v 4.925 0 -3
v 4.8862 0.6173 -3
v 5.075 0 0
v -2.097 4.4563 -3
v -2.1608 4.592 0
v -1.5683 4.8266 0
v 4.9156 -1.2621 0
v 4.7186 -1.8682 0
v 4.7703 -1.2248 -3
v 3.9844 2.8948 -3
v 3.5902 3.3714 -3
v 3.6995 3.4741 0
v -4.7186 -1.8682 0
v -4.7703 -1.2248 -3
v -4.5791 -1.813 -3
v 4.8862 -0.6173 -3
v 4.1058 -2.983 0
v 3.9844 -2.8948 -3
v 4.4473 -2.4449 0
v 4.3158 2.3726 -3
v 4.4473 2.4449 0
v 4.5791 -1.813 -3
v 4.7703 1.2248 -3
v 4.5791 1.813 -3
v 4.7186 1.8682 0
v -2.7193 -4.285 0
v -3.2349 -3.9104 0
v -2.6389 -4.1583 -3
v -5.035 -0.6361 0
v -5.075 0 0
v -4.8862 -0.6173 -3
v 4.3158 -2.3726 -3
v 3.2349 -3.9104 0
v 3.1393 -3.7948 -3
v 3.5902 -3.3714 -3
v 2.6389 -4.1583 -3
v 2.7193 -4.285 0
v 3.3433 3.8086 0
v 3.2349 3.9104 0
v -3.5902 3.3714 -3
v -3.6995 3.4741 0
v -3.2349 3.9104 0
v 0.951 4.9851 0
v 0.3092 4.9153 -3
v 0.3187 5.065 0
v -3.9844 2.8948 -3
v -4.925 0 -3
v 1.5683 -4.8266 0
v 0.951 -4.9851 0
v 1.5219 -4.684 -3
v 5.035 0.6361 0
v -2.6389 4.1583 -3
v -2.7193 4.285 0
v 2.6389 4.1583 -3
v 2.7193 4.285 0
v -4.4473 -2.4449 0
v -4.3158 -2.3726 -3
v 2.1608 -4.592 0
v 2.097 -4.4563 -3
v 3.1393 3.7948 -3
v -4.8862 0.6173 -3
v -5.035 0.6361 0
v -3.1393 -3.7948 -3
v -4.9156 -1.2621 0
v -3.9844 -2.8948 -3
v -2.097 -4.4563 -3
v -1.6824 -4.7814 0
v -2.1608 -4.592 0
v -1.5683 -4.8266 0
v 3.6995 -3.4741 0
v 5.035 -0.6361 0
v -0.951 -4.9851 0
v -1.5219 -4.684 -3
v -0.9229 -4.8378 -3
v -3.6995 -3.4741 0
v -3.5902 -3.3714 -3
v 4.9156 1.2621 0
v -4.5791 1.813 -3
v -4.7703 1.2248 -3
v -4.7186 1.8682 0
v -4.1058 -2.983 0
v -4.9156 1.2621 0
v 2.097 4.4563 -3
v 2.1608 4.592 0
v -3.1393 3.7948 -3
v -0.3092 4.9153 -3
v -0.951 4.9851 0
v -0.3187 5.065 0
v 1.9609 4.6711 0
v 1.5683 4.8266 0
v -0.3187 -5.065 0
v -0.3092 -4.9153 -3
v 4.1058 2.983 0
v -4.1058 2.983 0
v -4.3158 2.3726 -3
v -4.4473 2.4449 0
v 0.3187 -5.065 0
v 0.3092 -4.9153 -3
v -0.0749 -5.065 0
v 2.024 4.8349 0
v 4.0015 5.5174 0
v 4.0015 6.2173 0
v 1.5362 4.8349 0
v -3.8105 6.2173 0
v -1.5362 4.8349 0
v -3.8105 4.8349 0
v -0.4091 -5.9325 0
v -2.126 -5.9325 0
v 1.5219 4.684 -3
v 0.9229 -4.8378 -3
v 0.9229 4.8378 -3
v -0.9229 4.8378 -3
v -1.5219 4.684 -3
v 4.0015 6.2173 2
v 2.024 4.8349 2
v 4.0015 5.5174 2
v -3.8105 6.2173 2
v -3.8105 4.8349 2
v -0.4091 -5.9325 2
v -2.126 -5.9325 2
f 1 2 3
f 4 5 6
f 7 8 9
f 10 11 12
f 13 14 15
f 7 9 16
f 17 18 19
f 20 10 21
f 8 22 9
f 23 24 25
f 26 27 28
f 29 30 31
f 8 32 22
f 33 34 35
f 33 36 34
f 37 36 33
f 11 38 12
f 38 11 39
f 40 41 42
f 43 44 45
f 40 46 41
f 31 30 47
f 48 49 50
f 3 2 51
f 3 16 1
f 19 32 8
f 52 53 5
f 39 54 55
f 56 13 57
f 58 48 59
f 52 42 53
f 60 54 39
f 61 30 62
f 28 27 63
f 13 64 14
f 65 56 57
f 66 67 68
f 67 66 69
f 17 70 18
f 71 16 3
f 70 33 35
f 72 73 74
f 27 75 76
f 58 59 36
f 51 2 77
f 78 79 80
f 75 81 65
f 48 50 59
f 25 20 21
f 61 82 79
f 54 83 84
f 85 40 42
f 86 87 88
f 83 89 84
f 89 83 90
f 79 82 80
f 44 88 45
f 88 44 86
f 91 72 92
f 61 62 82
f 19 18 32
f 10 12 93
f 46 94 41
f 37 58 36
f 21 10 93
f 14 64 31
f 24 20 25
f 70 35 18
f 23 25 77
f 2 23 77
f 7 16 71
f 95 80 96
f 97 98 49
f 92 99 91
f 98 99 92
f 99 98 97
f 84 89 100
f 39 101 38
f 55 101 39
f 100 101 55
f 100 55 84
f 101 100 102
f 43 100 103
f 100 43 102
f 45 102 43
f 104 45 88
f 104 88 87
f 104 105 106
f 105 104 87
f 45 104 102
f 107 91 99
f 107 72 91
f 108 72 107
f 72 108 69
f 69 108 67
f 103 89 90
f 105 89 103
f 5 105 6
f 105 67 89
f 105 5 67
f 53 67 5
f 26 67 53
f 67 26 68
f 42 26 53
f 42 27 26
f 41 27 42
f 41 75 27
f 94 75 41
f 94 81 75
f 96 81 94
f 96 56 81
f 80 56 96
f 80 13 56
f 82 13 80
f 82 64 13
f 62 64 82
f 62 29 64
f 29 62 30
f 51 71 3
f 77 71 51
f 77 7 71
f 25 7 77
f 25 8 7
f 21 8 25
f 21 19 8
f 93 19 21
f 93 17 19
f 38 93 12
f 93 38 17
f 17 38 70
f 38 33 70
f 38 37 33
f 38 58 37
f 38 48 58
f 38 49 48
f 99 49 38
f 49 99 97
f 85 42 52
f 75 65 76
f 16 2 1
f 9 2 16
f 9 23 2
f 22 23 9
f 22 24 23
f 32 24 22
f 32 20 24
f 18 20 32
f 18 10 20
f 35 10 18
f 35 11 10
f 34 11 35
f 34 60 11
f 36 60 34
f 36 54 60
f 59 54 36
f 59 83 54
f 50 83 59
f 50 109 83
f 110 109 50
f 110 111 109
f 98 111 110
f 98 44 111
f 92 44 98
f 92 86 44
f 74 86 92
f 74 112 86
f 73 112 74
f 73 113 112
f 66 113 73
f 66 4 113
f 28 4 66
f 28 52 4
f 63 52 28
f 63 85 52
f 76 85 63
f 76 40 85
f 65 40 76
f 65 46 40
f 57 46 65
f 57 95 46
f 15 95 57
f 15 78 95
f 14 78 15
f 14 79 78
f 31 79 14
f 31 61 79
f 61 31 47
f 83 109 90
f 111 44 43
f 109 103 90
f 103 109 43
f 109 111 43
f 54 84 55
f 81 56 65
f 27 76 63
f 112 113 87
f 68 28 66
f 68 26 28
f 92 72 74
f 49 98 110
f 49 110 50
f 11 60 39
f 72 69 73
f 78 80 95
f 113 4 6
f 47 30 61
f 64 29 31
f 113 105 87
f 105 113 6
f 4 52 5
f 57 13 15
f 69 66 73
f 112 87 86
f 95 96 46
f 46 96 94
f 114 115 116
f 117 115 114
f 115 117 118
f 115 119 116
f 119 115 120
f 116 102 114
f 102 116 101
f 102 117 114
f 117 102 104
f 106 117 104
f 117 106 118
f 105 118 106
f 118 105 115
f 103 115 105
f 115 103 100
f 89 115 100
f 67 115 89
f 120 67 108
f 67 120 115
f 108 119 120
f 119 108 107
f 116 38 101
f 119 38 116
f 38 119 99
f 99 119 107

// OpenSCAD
$fn = 50;


difference() {
	union() {
		translate(v = [0, 0, -3.0000000000]) {
			cylinder(h = 3, r1 = 4.9250000000, r2 = 5.0750000000);
		}
		linear_extrude(height = 2) {
			text(font = "Impact", halign = "center", size = 12, text = "7", valign = "center");
		}
	}
	union();
}
